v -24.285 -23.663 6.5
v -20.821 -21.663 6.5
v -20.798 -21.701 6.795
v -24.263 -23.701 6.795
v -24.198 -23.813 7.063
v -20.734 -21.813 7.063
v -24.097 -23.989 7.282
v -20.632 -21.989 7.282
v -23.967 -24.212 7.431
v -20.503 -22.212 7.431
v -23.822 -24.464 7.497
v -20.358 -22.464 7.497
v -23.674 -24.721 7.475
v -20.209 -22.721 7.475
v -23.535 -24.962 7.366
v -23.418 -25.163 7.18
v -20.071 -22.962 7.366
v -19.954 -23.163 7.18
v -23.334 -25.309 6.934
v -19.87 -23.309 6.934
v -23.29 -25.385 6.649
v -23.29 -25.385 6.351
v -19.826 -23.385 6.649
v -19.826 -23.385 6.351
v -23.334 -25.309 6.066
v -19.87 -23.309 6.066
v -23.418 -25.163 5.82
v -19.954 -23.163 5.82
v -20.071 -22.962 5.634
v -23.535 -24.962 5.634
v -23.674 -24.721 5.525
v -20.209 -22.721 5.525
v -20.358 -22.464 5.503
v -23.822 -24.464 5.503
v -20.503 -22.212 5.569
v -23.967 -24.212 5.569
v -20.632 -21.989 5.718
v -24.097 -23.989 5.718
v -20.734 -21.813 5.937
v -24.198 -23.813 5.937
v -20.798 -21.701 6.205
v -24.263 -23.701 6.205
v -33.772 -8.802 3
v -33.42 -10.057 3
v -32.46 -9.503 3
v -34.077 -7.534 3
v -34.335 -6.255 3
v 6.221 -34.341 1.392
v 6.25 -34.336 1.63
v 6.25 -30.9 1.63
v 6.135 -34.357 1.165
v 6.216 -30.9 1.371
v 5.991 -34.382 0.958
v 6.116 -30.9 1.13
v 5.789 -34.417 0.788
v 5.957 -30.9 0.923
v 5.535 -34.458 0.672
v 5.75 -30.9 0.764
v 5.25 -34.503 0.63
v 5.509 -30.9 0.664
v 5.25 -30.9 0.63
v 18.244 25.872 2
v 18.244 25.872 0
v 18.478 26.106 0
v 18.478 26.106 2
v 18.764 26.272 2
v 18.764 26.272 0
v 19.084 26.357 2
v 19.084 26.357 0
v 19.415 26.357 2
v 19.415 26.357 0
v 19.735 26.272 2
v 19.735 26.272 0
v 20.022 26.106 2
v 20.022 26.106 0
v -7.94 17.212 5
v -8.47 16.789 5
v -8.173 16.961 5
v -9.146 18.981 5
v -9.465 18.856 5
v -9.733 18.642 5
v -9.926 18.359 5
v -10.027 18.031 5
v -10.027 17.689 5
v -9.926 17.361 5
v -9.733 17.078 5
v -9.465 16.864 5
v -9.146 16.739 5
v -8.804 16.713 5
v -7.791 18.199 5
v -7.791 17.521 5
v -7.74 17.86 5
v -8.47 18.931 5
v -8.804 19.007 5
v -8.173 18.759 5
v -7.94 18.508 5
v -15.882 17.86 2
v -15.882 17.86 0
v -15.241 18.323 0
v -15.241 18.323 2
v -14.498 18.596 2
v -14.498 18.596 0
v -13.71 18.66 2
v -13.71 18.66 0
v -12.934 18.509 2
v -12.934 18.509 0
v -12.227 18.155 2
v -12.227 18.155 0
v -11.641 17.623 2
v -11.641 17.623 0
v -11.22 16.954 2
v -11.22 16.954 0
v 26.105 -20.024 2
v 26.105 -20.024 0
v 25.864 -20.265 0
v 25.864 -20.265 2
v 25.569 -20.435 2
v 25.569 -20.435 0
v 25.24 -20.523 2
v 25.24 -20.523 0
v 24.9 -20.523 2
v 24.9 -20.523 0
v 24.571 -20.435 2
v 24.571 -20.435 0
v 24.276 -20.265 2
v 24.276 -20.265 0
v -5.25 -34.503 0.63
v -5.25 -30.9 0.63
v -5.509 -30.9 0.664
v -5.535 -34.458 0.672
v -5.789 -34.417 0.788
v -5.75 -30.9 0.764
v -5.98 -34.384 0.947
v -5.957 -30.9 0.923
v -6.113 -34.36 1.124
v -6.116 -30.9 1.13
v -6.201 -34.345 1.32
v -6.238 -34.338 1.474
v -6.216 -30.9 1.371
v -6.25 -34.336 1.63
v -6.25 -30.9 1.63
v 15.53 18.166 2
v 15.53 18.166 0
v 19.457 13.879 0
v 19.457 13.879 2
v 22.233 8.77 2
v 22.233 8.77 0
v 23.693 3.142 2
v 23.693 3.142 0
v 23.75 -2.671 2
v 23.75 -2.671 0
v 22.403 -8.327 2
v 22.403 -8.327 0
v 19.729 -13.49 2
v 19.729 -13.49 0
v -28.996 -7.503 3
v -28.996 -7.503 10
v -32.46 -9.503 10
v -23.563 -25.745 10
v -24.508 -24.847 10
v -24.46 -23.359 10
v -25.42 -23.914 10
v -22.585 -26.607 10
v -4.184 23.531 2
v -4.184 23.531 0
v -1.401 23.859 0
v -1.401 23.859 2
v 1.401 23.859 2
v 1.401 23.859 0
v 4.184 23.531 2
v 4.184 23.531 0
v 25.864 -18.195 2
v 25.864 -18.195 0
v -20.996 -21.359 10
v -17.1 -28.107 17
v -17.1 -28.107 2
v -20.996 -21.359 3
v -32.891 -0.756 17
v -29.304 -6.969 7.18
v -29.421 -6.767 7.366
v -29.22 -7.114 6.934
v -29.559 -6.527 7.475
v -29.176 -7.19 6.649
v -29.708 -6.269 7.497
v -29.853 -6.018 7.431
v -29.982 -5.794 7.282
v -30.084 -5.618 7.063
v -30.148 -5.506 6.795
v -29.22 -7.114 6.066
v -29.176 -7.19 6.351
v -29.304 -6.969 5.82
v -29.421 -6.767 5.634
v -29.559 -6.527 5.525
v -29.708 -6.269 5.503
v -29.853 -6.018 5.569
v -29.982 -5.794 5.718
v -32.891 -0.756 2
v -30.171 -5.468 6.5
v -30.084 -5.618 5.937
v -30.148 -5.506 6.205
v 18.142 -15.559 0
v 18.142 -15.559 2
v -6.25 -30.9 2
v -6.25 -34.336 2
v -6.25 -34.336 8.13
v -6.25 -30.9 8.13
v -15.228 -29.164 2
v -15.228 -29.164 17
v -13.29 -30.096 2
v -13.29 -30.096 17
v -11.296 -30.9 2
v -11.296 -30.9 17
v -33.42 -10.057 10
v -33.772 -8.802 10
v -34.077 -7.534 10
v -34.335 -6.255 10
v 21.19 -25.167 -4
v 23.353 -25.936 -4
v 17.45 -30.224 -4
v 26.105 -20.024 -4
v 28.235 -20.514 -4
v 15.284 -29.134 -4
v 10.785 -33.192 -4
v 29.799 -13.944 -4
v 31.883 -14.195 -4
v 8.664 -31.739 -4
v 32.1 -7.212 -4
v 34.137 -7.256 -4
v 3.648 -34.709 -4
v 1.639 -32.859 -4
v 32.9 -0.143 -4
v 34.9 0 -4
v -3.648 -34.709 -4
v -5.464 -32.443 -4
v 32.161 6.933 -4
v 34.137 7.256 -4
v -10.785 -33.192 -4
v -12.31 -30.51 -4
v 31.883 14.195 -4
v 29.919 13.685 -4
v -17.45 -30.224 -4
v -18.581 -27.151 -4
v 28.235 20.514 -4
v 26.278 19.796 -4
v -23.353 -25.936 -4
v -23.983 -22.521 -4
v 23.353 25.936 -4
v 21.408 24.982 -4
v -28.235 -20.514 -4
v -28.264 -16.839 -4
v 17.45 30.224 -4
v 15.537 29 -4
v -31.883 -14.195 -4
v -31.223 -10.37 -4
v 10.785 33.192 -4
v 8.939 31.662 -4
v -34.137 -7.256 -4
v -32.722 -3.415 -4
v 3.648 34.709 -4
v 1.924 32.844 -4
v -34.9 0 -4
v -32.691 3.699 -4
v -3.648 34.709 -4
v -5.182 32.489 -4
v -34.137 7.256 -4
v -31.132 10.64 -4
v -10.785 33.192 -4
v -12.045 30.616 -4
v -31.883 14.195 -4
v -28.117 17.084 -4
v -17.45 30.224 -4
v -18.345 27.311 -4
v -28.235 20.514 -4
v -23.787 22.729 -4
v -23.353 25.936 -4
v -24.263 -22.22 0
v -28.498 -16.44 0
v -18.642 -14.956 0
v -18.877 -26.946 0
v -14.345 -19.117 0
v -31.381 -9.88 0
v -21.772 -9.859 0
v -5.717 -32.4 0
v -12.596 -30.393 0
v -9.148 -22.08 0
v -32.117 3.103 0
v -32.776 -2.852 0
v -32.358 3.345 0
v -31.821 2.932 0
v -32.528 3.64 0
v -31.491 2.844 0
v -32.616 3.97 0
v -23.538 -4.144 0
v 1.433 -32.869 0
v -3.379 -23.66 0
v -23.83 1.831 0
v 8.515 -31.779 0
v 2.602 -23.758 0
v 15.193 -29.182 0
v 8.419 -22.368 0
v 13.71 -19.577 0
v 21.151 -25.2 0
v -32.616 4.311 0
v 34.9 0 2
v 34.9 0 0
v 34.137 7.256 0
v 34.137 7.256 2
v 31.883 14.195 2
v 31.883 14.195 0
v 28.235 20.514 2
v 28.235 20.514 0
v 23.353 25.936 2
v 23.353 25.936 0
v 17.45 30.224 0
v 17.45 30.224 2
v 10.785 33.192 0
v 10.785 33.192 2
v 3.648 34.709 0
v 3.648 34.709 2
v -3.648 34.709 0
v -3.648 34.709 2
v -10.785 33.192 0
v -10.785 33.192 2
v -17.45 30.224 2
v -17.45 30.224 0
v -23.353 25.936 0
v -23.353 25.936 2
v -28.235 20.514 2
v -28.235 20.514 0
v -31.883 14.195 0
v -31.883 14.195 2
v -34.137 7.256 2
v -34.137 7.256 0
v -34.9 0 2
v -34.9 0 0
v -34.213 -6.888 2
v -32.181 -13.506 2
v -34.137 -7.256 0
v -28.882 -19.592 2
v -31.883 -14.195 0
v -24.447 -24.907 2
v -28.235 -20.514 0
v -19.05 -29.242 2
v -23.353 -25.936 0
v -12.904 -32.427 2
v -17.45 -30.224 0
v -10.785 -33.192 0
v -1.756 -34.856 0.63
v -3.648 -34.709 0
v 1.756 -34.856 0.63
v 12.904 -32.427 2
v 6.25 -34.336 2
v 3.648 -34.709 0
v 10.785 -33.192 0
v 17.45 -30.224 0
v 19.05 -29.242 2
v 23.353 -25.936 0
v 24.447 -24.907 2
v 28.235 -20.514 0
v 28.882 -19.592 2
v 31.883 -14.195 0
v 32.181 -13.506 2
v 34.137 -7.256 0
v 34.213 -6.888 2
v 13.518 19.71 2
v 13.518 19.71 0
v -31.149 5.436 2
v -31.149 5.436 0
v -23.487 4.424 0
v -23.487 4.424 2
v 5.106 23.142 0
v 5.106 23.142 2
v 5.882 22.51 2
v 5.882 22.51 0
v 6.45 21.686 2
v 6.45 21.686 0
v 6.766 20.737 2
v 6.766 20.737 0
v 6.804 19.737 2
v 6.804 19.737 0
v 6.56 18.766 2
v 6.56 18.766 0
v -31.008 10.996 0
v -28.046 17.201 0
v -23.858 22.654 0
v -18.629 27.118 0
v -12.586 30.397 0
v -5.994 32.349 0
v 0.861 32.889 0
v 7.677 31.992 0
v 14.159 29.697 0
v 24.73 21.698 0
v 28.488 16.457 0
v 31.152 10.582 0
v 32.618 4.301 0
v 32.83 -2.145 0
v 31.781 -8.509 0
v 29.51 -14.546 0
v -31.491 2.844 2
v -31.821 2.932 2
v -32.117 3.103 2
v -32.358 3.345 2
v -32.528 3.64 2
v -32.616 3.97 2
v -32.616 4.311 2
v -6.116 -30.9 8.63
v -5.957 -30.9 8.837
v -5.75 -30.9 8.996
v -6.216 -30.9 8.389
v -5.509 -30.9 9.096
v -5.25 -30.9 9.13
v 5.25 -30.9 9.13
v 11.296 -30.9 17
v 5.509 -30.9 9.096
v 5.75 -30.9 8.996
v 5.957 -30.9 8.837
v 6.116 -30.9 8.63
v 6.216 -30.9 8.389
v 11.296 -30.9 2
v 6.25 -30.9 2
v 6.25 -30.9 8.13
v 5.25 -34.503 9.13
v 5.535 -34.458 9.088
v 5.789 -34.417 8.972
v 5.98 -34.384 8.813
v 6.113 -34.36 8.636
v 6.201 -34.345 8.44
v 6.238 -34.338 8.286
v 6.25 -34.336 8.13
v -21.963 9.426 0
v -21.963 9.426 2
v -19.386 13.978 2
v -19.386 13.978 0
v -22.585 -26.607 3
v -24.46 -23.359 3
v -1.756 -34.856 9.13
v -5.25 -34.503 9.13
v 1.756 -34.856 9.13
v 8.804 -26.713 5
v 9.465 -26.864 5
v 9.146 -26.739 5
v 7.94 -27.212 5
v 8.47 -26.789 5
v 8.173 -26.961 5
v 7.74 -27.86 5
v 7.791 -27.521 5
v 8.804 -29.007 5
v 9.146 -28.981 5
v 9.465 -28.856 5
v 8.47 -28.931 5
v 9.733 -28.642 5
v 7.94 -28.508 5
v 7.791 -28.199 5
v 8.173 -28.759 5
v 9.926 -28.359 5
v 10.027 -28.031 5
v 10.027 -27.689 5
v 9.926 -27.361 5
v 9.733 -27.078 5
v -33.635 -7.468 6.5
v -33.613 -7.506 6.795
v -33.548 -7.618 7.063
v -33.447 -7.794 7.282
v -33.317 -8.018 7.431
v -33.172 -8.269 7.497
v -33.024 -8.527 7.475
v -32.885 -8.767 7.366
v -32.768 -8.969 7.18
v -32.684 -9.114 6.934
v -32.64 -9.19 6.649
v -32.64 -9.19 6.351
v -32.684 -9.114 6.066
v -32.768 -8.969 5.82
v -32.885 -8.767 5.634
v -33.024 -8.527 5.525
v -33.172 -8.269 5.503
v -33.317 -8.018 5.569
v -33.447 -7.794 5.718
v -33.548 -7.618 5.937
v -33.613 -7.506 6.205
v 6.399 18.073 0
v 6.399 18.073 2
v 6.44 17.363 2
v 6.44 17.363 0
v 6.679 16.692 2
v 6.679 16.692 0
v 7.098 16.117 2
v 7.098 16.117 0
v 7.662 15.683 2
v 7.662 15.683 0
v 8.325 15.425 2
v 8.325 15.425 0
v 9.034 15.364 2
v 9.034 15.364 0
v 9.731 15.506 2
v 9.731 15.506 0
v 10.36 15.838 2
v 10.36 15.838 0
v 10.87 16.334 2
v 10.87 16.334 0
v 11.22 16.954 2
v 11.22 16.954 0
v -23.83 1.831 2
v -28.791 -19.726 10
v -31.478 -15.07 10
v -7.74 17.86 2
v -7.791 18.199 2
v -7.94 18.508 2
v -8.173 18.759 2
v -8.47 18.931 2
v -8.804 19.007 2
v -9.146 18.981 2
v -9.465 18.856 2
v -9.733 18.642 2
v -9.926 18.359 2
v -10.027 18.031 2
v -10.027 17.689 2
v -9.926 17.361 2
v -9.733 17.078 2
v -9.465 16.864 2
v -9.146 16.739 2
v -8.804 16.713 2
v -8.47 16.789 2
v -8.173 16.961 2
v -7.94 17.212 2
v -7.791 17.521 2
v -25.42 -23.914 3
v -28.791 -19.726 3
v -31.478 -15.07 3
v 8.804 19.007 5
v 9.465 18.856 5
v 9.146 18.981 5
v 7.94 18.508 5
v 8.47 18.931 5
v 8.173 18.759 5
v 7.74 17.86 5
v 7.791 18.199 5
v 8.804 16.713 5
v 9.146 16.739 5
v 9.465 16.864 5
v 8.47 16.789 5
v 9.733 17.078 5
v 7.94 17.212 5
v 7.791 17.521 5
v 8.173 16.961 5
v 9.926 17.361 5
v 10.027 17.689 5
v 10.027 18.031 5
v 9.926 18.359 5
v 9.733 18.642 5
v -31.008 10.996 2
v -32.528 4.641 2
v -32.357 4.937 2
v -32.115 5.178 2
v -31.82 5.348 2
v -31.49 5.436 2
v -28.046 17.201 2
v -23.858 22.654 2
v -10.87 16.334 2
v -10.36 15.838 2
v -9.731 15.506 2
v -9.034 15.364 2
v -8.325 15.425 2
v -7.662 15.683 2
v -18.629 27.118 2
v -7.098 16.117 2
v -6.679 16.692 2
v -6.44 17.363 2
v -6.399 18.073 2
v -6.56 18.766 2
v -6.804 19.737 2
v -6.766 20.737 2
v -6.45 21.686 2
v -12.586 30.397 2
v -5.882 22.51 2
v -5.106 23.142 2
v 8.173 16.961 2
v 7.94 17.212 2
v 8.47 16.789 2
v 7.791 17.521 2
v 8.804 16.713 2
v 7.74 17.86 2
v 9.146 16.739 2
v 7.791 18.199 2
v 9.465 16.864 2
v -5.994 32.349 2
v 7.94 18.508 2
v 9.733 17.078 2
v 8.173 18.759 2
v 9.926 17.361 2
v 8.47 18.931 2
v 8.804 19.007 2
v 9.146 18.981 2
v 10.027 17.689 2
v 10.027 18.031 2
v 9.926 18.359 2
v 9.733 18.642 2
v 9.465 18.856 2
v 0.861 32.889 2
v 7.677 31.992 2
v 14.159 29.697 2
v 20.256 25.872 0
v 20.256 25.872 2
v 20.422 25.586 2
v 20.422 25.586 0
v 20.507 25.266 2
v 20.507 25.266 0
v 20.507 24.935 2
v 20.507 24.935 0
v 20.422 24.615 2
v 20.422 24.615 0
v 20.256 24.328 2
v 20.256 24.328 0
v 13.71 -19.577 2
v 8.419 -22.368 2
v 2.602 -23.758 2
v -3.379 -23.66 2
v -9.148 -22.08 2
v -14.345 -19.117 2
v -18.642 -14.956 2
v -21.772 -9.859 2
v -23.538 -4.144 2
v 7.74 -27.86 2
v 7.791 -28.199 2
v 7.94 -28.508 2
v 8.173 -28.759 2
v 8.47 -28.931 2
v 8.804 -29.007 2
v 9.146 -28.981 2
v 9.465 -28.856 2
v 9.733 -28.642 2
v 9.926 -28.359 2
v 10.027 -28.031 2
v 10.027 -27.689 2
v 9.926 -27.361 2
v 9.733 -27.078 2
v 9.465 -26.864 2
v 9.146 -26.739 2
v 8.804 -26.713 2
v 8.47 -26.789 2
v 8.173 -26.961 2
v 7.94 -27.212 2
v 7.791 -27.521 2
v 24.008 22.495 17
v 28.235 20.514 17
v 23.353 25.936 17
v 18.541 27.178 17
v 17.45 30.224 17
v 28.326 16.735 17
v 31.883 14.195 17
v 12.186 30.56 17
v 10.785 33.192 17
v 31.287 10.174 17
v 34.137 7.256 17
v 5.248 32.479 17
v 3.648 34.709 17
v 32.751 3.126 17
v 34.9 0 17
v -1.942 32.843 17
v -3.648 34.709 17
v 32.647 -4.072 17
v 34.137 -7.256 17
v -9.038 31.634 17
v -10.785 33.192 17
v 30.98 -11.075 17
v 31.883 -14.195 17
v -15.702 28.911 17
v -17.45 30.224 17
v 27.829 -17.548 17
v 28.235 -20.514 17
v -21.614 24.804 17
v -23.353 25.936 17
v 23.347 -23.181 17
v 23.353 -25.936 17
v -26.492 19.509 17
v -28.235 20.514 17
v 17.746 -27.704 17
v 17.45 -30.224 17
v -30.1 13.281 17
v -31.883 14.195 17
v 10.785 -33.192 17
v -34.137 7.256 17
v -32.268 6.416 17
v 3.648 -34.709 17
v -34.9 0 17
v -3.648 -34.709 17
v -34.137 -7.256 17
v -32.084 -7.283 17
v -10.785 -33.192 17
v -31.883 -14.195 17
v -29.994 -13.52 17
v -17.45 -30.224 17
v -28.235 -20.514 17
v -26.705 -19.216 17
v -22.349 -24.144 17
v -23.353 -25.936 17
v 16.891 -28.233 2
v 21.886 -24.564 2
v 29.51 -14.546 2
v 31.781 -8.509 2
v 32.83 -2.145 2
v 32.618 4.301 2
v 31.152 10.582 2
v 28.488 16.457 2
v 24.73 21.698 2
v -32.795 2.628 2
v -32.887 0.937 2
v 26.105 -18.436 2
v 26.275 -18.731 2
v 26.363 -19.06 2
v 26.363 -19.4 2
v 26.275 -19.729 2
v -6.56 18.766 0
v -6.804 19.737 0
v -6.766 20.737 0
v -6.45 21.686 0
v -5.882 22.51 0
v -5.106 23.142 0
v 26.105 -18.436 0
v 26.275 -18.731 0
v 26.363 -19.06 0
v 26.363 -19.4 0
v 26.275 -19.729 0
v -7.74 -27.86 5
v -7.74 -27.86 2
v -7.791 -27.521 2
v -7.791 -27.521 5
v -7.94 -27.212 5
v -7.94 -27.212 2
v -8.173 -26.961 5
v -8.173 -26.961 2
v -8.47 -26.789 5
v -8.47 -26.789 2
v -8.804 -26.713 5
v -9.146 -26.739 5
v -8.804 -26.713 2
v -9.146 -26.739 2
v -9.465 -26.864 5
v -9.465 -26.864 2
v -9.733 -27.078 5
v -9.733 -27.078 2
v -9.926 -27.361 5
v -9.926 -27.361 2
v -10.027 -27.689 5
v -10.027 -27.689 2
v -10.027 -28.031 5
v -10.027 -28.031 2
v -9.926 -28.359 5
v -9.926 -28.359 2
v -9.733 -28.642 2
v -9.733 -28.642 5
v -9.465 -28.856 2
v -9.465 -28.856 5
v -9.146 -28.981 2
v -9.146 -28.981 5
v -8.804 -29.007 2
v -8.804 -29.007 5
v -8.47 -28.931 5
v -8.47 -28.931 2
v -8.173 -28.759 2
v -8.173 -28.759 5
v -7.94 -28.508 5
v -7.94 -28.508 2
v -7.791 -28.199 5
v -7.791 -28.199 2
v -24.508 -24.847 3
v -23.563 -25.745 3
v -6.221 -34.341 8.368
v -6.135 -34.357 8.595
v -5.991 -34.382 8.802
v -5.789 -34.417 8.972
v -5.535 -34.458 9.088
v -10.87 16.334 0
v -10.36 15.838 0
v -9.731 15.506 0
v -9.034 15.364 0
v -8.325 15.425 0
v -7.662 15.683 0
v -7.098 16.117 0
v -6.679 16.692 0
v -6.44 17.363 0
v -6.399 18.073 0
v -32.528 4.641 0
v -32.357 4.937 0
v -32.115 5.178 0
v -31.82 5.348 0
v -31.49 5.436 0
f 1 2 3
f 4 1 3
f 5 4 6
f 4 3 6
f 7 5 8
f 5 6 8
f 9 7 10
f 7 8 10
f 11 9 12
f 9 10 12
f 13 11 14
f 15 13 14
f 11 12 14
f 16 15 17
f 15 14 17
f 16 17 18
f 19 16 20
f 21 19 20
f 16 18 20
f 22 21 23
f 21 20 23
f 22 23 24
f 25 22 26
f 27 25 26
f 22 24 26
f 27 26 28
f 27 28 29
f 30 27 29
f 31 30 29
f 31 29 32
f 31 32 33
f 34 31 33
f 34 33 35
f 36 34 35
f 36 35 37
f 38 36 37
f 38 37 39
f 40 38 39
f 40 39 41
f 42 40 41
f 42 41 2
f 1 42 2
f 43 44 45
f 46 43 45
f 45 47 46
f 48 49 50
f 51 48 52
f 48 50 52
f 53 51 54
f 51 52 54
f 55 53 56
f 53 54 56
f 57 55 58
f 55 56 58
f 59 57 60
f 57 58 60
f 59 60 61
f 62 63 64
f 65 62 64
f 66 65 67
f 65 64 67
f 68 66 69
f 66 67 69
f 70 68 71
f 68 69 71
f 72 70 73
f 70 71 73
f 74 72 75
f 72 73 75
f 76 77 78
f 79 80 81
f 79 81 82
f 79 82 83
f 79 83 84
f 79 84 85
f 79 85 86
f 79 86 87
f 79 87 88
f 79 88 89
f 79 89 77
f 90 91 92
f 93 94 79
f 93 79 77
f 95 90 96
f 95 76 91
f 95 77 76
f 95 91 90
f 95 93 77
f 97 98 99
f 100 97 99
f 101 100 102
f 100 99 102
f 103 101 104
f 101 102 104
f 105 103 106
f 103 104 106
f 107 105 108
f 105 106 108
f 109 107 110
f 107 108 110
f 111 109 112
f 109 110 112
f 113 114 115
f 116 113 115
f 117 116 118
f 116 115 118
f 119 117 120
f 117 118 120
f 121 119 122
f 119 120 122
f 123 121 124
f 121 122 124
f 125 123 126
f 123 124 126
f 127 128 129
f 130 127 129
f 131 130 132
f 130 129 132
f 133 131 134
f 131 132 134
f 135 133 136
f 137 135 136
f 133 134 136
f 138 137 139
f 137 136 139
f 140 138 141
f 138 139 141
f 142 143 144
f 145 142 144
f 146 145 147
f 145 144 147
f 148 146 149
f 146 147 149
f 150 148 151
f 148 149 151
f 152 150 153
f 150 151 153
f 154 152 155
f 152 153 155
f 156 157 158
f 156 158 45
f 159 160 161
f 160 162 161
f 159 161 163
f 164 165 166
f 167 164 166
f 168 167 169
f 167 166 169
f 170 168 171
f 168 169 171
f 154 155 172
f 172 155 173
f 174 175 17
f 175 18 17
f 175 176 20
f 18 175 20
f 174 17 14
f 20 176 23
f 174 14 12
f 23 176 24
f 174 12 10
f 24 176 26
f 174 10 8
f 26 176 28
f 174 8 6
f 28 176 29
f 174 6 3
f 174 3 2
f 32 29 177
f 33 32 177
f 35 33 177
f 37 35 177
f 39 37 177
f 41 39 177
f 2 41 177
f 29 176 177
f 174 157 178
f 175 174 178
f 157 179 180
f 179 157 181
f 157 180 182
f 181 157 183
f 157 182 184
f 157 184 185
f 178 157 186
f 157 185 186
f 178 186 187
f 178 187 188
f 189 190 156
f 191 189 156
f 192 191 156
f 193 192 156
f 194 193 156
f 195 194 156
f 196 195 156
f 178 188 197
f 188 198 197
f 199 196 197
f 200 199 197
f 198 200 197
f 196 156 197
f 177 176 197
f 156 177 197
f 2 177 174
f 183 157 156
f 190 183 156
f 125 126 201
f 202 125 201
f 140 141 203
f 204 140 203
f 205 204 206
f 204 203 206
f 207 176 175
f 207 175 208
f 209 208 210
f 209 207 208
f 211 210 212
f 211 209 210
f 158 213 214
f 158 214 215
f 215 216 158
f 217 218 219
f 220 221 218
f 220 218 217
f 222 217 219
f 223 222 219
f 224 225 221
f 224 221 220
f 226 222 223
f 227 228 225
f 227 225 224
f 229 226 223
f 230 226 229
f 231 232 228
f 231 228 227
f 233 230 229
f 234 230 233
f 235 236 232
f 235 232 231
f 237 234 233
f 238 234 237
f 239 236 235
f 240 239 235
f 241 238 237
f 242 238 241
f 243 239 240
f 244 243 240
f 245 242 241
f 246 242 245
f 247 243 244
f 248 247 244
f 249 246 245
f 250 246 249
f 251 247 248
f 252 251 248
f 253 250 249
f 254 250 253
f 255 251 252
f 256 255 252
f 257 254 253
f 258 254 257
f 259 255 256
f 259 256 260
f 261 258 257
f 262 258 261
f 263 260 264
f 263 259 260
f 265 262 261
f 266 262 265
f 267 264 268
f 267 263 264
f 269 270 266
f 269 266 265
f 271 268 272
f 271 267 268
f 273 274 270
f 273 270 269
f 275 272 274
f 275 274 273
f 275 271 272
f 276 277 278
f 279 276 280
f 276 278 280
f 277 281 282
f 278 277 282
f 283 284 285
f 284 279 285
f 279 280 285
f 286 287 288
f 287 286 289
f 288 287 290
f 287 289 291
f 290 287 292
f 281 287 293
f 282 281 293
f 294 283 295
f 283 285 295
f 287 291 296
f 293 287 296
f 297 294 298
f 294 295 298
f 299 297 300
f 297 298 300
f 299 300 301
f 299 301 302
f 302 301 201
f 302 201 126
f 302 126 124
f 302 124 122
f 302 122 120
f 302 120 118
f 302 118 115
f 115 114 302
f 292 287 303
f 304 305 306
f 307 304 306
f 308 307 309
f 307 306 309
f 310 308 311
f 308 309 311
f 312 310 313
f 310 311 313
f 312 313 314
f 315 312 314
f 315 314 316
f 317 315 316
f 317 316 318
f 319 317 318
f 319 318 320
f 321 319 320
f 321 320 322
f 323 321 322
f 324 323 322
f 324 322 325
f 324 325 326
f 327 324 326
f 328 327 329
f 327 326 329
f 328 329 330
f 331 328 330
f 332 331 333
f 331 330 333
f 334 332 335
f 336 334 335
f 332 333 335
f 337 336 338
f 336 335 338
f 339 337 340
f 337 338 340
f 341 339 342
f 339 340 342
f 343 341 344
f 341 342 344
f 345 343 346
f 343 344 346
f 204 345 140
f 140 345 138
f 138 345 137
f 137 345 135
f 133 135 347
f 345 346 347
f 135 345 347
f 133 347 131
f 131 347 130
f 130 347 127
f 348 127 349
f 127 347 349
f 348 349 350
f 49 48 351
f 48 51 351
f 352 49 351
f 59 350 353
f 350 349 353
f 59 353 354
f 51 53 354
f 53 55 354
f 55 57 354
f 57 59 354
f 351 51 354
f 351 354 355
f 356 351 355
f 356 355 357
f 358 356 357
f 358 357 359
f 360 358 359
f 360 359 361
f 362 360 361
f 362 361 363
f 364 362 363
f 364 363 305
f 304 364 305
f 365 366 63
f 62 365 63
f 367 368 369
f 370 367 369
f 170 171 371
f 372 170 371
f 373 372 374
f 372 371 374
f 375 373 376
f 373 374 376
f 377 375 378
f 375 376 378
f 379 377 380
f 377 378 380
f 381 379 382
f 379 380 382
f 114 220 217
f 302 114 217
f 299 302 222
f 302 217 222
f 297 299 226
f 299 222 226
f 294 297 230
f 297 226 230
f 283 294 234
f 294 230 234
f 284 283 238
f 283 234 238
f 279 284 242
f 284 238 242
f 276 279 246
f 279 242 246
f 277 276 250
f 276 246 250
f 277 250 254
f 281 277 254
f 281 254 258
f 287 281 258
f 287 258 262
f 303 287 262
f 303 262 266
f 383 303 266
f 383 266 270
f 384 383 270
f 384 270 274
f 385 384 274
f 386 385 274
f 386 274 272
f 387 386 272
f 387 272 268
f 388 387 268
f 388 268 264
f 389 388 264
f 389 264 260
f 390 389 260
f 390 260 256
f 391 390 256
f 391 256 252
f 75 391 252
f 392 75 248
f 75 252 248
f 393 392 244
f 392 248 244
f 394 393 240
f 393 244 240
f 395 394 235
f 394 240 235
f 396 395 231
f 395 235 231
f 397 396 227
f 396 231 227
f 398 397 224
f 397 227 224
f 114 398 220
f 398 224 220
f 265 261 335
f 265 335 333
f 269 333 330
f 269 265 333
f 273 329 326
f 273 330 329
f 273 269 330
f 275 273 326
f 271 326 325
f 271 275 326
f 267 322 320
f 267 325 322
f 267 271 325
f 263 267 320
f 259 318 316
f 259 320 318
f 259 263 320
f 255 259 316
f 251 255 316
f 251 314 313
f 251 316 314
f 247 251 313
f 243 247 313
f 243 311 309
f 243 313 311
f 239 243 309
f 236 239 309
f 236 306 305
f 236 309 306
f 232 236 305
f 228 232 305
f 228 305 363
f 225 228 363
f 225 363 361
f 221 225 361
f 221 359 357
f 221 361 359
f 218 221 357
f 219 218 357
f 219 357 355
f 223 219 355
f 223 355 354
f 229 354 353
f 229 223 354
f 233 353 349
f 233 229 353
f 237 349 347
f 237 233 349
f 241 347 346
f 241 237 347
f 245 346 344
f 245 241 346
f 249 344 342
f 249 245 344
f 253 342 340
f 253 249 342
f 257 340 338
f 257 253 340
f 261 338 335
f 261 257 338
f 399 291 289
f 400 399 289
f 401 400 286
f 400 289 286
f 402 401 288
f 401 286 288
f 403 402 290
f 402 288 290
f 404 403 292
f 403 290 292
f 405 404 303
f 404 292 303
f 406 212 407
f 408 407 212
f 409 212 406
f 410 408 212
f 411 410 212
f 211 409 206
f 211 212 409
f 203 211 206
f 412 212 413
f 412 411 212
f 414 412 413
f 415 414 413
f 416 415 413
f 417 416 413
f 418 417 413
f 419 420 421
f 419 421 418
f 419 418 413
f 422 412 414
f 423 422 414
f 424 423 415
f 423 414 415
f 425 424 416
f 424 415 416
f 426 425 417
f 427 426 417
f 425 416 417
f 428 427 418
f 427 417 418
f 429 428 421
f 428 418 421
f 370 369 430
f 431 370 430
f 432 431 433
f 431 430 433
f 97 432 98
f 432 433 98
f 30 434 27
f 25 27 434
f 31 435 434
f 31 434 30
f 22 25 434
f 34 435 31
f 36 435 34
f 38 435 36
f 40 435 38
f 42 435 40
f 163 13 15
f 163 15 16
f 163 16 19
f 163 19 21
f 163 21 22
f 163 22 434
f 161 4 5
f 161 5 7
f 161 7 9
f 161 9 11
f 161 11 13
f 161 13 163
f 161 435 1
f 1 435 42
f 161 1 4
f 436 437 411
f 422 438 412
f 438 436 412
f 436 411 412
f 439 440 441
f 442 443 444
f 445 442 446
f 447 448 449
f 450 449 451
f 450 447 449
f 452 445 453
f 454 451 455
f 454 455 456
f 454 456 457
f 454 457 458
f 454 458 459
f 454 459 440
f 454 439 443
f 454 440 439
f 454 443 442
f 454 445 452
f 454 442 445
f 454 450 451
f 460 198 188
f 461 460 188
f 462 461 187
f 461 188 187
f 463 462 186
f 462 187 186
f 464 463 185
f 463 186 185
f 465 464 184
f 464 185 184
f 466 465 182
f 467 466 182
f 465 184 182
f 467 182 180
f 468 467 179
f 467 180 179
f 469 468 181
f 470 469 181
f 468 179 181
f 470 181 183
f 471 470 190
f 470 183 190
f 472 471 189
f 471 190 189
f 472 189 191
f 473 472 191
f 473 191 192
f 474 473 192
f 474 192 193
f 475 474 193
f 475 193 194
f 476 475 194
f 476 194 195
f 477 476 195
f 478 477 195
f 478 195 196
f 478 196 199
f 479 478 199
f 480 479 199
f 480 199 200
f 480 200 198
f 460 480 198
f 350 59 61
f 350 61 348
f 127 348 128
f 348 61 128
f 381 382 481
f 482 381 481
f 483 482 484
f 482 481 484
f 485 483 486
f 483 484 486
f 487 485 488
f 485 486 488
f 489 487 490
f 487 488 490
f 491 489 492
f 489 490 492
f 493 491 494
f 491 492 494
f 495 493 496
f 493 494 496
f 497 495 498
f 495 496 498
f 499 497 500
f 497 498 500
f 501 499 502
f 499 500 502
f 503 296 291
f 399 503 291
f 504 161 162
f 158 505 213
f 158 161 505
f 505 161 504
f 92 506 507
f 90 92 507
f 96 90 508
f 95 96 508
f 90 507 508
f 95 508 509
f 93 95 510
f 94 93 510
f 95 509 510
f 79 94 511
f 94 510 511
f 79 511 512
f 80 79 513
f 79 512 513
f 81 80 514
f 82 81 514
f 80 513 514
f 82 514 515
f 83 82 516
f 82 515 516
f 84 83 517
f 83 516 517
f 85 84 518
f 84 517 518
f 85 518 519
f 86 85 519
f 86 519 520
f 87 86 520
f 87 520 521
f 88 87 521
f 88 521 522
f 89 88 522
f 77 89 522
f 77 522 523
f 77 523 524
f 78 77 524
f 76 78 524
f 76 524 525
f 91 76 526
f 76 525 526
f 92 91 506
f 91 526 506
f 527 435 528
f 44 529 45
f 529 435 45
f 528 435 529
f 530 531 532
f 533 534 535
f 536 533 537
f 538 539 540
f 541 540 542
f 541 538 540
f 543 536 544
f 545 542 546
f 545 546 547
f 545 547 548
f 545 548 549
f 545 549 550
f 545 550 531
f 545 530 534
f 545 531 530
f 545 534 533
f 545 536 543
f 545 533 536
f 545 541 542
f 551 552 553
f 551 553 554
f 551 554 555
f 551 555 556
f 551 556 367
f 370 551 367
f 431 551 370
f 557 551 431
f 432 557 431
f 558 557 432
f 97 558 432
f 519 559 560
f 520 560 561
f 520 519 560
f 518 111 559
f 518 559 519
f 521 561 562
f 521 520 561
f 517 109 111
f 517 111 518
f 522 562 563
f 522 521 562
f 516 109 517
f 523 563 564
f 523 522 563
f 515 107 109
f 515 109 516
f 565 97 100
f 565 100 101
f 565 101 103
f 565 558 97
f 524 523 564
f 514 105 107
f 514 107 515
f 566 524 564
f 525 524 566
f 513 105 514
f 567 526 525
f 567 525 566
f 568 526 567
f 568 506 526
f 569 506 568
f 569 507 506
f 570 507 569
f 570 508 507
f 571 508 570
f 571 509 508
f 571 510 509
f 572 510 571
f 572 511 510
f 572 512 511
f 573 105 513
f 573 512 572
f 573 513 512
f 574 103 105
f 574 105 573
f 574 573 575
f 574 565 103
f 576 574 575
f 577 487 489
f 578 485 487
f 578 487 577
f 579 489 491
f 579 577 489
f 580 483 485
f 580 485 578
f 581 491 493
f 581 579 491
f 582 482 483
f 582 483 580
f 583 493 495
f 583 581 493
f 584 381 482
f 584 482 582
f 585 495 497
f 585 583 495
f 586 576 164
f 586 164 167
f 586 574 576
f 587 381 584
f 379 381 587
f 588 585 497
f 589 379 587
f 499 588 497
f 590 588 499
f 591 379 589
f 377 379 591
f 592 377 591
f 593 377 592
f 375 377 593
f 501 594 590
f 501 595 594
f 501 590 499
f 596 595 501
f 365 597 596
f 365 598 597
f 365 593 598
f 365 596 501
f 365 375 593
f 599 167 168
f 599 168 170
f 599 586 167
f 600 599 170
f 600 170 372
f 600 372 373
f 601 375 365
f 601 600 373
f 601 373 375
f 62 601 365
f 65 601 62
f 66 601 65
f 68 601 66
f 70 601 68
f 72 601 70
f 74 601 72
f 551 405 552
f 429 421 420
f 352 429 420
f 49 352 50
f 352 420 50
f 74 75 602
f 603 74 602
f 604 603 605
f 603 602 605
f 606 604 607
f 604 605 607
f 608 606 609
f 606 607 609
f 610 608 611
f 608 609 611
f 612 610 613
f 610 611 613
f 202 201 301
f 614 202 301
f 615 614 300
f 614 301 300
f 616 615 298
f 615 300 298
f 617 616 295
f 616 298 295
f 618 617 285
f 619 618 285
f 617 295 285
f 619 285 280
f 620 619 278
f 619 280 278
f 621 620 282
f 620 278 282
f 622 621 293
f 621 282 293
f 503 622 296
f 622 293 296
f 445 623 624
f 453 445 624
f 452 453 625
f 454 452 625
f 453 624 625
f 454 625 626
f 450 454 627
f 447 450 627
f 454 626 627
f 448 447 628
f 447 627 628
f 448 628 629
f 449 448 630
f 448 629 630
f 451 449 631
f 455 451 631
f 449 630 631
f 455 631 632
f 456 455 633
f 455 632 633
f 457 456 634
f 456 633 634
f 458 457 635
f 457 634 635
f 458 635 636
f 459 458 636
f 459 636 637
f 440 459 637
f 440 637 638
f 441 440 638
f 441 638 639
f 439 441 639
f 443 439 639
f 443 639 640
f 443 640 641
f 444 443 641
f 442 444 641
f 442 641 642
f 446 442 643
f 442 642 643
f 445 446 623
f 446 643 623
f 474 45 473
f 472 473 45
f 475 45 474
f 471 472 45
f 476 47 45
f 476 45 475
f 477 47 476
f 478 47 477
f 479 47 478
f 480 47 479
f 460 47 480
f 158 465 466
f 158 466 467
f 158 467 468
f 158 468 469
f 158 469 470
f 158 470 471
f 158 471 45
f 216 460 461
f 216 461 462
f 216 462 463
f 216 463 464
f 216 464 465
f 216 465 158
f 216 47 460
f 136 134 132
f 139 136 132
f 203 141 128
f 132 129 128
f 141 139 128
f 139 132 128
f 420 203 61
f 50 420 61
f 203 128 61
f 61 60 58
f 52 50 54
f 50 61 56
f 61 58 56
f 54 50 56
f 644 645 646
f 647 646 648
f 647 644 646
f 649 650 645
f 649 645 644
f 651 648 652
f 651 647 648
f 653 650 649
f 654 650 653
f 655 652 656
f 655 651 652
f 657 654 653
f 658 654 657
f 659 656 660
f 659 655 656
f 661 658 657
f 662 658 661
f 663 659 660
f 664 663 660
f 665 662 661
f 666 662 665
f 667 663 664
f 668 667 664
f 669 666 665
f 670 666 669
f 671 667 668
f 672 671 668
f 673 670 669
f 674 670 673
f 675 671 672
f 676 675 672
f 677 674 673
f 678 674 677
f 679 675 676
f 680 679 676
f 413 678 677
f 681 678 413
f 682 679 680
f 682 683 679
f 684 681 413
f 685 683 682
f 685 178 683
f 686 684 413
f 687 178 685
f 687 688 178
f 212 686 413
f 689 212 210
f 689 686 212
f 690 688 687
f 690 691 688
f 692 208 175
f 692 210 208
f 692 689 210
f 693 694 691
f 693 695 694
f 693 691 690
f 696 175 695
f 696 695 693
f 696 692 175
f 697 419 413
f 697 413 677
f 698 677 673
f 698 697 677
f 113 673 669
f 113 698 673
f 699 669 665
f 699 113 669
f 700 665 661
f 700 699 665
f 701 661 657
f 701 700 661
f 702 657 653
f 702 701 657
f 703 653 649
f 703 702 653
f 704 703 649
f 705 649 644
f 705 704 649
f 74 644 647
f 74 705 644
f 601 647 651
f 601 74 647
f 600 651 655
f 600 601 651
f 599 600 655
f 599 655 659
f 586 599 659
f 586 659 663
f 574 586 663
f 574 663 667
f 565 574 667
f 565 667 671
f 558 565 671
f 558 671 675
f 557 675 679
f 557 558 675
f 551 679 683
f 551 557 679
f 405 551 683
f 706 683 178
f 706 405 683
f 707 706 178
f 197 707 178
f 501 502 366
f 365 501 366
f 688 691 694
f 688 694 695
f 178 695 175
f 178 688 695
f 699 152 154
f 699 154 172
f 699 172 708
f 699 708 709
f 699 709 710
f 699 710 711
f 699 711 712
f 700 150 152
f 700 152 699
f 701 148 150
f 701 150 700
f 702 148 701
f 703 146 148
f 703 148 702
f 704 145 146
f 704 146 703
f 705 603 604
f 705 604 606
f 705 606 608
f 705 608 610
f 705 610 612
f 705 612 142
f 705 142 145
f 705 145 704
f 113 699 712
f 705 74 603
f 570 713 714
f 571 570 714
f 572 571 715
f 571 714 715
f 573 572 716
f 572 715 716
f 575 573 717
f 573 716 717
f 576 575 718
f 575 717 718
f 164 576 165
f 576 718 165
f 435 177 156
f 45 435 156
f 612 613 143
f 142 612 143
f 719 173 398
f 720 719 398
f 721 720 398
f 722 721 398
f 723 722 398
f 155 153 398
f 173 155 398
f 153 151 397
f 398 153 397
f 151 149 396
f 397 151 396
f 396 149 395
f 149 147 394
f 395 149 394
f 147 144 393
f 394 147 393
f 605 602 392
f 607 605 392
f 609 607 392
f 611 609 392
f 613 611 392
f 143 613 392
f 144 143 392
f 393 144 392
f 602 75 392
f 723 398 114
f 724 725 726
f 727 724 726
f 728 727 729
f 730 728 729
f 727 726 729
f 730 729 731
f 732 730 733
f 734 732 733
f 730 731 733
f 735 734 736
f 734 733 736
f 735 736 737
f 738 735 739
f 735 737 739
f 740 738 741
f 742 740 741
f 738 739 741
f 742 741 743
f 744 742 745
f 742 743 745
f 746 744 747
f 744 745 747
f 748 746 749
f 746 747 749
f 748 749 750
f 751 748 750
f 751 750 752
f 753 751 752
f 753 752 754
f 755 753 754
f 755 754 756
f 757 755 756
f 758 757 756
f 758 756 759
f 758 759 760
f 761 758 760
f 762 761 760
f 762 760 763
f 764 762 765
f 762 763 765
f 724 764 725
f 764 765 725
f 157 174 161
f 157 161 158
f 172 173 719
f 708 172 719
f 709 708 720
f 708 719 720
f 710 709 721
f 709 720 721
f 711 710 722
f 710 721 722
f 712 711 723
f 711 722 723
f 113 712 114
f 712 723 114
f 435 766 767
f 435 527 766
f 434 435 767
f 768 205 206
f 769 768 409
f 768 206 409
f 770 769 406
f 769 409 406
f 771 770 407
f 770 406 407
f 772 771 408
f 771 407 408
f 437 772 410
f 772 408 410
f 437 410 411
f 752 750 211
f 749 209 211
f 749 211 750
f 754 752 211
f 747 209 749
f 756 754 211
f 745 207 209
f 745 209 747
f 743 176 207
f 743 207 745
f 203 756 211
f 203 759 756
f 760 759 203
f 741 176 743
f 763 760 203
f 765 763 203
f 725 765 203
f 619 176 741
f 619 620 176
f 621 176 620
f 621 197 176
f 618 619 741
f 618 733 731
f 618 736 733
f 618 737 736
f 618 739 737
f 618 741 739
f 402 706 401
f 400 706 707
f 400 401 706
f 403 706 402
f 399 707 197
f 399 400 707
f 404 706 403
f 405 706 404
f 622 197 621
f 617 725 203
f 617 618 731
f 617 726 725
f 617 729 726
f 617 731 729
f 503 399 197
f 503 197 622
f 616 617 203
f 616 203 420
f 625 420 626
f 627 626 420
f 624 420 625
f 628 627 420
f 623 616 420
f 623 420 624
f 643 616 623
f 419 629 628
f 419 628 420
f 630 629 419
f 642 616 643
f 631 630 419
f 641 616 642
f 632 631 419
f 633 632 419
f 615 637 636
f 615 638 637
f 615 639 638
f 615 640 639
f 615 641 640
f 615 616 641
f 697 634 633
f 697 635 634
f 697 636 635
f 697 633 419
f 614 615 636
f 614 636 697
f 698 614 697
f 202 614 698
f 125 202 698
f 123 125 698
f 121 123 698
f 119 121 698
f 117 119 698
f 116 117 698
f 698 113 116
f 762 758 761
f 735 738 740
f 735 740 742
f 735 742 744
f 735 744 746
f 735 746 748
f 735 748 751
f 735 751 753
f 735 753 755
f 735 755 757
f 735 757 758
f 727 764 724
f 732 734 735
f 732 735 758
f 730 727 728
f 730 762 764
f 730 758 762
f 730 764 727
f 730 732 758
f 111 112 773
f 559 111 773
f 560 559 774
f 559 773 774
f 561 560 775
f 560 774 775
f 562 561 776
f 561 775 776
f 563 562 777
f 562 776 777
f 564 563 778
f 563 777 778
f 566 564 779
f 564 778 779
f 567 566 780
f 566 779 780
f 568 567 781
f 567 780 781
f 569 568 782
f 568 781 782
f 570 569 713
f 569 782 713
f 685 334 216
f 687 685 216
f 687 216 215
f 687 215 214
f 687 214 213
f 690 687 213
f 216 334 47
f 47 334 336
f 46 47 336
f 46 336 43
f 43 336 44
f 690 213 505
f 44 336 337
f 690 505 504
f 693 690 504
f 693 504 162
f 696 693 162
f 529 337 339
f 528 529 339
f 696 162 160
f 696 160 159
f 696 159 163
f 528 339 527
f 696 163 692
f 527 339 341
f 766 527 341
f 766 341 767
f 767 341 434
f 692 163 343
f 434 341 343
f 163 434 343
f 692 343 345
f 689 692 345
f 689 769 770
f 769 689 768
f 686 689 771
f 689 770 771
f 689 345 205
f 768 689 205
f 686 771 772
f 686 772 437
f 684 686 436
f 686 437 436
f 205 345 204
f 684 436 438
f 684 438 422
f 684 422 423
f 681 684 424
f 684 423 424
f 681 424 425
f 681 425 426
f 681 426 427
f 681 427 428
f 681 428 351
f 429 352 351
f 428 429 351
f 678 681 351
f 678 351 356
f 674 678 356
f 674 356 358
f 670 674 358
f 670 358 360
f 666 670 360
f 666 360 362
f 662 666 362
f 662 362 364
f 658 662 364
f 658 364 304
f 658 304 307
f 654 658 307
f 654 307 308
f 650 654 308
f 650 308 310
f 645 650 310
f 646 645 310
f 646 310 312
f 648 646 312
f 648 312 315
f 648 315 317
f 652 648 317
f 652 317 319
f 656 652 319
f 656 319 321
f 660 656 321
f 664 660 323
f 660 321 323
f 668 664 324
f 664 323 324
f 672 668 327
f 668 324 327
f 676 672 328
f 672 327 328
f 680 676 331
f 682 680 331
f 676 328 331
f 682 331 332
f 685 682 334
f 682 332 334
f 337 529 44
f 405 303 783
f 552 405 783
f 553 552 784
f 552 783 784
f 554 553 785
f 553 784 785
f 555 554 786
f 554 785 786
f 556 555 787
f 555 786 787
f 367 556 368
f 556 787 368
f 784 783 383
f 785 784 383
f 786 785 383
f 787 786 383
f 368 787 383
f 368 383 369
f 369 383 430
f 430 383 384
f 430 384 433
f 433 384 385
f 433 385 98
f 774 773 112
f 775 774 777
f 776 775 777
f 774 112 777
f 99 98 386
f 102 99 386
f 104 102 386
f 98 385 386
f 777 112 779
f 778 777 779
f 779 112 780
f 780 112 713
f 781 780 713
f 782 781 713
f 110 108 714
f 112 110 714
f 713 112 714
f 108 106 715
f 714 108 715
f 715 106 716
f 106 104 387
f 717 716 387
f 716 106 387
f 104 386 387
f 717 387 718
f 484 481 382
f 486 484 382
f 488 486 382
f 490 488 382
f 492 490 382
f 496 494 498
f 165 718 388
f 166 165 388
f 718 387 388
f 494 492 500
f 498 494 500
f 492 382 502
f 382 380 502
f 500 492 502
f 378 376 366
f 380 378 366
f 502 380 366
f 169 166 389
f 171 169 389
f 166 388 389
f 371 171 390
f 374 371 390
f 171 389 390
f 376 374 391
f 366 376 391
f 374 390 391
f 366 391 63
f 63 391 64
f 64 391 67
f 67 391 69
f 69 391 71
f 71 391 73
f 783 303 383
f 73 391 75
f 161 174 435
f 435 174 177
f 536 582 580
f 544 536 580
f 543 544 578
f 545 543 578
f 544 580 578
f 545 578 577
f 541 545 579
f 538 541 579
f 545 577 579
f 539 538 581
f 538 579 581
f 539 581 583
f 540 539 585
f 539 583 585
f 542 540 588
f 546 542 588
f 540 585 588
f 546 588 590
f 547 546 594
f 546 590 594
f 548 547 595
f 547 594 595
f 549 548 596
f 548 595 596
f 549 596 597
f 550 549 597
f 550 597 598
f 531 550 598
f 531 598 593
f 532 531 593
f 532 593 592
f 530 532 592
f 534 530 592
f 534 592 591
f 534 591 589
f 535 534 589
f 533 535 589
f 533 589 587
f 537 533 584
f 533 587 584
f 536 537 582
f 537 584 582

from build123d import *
from build123d.topology import SkipClean

# Parameters (mm, degrees)
ESQUISSE_SUPPORT_R           = 34.9
BOSS_EXTRU_1_DEPTH           = 2
ESQUISSE6_R                  = 1.15
BOSS_EXTRU_2_DEPTH           = 3
BOSS_EXTRU_3_START           = 4
ESQUISSE7_R                  = 34.9
ESQUISSE7_R_2                = 32.9
BOSS_EXTRU_3_DEPTH           = 4
ESQUISSE8_R                  = 34.9
BOSS_EXTRU_5_DEPTH           = 15
ENL_V_MAT_EXTRU_1_DEPTH      = 10
BOSS_EXTRU_6_DEPTH           = 15
ESQUISSE10_R                 = 1
ESQUISSE10_W                 = 7
ESQUISSE10_H                 = 16
ENL_V_MAT_EXTRU_2_DEPTH      = 80.435952156
ENL_V_MAT_EXTRU_3_DEPTH      = 60.597051983
ENL_V_MAT_EXTRU_3_DEPTH_BACK = 60.597051983
ESQUISSE12_W                 = 5
ESQUISSE12_H                 = 7


with BuildPart() as part:
    # Esquisse_support → Boss.-Extru.1 (new body)
    with BuildSketch(Plane.XY):
        Circle(ESQUISSE_SUPPORT_R)
        with BuildLine():
            ThreePointArc((-6.559988321, 18.766115653), (-6.450497051, 21.686422251), (-4.183806862, 23.530953235))
            ThreePointArc((-4.183806862, 23.530953235), (0, 23.9), (4.183806862, 23.530953235))
            ThreePointArc((4.183806862, 23.530953235), (6.450497051, 21.686422251), (6.559988321, 18.766115653))
            ThreePointArc((6.559988321, 18.766115653), (7.983884347, 15.529988321), (11.220011679, 16.953884347))
            Line((11.220011679, 16.953884347), (13.517895322, 19.709807357))
            Line((13.517895322, 19.709807357), (18.243699169, 25.871764581))
            ThreePointArc((18.243699169, 25.871764581), (19.084157828, 26.35728211), (20.021764581, 26.106300831))
            ThreePointArc((20.021764581, 26.106300831), (20.50728211, 25.265842172), (20.256300831, 24.328235419))
            Line((20.256300831, 24.328235419), (15.530496983, 18.166278195))
            ThreePointArc((15.530496983, 18.166278195), (23.692512492, 3.142427693), (19.729143793, -13.489658454))
            Line((19.729143793, -13.489658454), (25.863736665, -18.195211742))
            ThreePointArc((25.863736665, -18.195211742), (26.362962372, -19.059550784), (26.104788258, -20.023736665))
            ThreePointArc((26.104788258, -20.023736665), (25.240449216, -20.522962372), (24.276263335, -20.264788258))
            Line((24.276263335, -20.264788258), (18.141670463, -15.559234969))
            ThreePointArc((18.141670463, -15.559234969), (-9.148411266, -22.079777429), (-23.829761597, 1.830973023))
            Line((-23.829761597, 1.830973023), (-31.491348477, 2.843711519))
            ThreePointArc((-31.491348477, 2.843711519), (-32.357776046, 3.344547295), (-32.616288481, 4.311348477))
            ThreePointArc((-32.616288481, 4.311348477), (-32.115452705, 5.177776046), (-31.148651523, 5.436288481))
            Line((-31.148651523, 5.436288481), (-23.487064643, 4.423549986))
            ThreePointArc((-23.487064643, 4.423549986), (-20.799295594, 11.772820511), (-15.881763126, 17.86))
            ThreePointArc((-15.881763126, 17.86), (-13.316845537, 18.611032405), (-11.220011679, 16.953884347))
            ThreePointArc((-11.220011679, 16.953884347), (-7.983884347, 15.529988321), (-6.559988321, 18.766115653))
        make_face(mode=Mode.SUBTRACT)
    extrude(amount=BOSS_EXTRU_1_DEPTH)

    # Esquisse6 → Boss.-Extru.2 (add)
    with BuildSketch(Plane.XY.offset(2)):
        with Locations((-8.89, 17.86)):
            Circle(ESQUISSE6_R)
        with Locations((-8.89, -27.86)):
            Circle(ESQUISSE6_R)
        with Locations(Location((8.89, -27.86, 0), (0, 0, 180))):
            Circle(ESQUISSE6_R)
        with Locations(Location((8.89, 17.86, 0), (0, 0, 180))):
            Circle(ESQUISSE6_R)
    extrude(amount=BOSS_EXTRU_2_DEPTH)

    # Esquisse7 → Boss.-Extru.3 (add)
    with BuildSketch(Plane(origin=(0, 0, 0), x_dir=(-1, 0, 0), z_dir=(0, 0, -1)).offset(BOSS_EXTRU_3_START)):
        Circle(ESQUISSE7_R)
        with Locations(Location((0, 0, 0), (0, 0, 217.490091077))):
            Circle(ESQUISSE7_R_2, mode=Mode.SUBTRACT)
    extrude(amount=-BOSS_EXTRU_3_DEPTH)

    # Esquisse8 → Boss.-Extru.5 (add)
    with BuildSketch(Plane.XY.offset(2)):
        with Locations(Location((0, 0, 0), (0, 0, 180))):
            Circle(ESQUISSE8_R)
        with BuildLine():
            Line((-11.296016997, -30.9), (11.296016997, -30.9))
            ThreePointArc((11.296016997, -30.9), (0, 32.9), (-11.296016997, -30.9))
        make_face(mode=Mode.SUBTRACT)
    extrude(amount=BOSS_EXTRU_5_DEPTH)

    # Ouverture_USB → Enlèv. mat.-Extru.1 (cut)
    with SkipClean():  # the faces are left unmerged after this step: merging them gives an invalid solid
        with BuildSketch(Plane(origin=(0, -30.9, 0), x_dir=(1, 0, 0), z_dir=(0, 1, 0))):
            with BuildLine():
                Line((-5.25, -9.13), (5.25, -9.13))
                ThreePointArc((5.25, -9.13), (5.957106781, -8.837106781), (6.25, -8.13))
                Line((6.25, -8.13), (6.25, -1.63))
                ThreePointArc((6.25, -1.63), (5.957106781, -0.922893219), (5.25, -0.63))
                Line((5.25, -0.63), (-5.25, -0.63))
                ThreePointArc((-5.25, -0.63), (-5.957106781, -0.922893219), (-6.25, -1.63))
                Line((-6.25, -1.63), (-6.25, -8.13))
                ThreePointArc((-6.25, -8.13), (-5.957106781, -8.837106781), (-5.25, -9.13))
            make_face()
        extrude(amount=-ENL_V_MAT_EXTRU_1_DEPTH, mode=Mode.SUBTRACT)

    # Esquisse9 → Boss.-Extru.6 (add, through all)
    with SkipClean():  # the faces are left unmerged after this step: merging them gives an invalid solid
        with BuildSketch(Plane.XY.offset(2)):
            with BuildLine():
                Line((-17.100090688, -28.106883471), (-32.891320451, -0.755671208))
                ThreePointArc((-32.891320451, -0.755671208), (-28.492235785, -16.45), (-17.100090688, -28.106883471))
            make_face()
        extrude(amount=BOSS_EXTRU_6_DEPTH)

    # Esquisse10 → Enlèv. mat.-Extru.2 (cut, through all)
    with SkipClean():  # the faces are left unmerged after this step: merging them gives an invalid solid
        with BuildSketch(Plane(origin=(-24.99570557, -14.431277339, 0), x_dir=(0, 0, -1), z_dir=(0.8660254037844363, 0.5000000000000042, 0))):
            with Locations(Location((-6.5, -9.35, 0), (0, 0, 90))):
                Circle(ESQUISSE10_R)
            with Locations(Location((-6.5, 9.35, 0), (0, 0, 90))):
                Circle(ESQUISSE10_R)
            with Locations((-6.5, 0)):
                Rectangle(ESQUISSE10_W, ESQUISSE10_H)
        extrude(amount=-ENL_V_MAT_EXTRU_2_DEPTH, mode=Mode.SUBTRACT)

    # Esquisse12 → Enlèv. mat.-Extru.3 (cut, two sides: drawn at the far end of the back side and taken through both)
    with SkipClean():  # the faces are left unmerged after this step: merging them gives an invalid solid
        with BuildSketch(Plane(origin=(-4, 6.92820323, 0), x_dir=(0.8660254037844364, 0.5000000000000041, 0), z_dir=(0.5000000000000041, -0.8660254037844364, 0)).offset(-ENL_V_MAT_EXTRU_3_DEPTH_BACK)):
            with Locations((-35.362554679, 6.5)):
                Rectangle(ESQUISSE12_W, ESQUISSE12_H)
        extrude(amount=ENL_V_MAT_EXTRU_3_DEPTH + ENL_V_MAT_EXTRU_3_DEPTH_BACK, mode=Mode.SUBTRACT)


solid = part.part
